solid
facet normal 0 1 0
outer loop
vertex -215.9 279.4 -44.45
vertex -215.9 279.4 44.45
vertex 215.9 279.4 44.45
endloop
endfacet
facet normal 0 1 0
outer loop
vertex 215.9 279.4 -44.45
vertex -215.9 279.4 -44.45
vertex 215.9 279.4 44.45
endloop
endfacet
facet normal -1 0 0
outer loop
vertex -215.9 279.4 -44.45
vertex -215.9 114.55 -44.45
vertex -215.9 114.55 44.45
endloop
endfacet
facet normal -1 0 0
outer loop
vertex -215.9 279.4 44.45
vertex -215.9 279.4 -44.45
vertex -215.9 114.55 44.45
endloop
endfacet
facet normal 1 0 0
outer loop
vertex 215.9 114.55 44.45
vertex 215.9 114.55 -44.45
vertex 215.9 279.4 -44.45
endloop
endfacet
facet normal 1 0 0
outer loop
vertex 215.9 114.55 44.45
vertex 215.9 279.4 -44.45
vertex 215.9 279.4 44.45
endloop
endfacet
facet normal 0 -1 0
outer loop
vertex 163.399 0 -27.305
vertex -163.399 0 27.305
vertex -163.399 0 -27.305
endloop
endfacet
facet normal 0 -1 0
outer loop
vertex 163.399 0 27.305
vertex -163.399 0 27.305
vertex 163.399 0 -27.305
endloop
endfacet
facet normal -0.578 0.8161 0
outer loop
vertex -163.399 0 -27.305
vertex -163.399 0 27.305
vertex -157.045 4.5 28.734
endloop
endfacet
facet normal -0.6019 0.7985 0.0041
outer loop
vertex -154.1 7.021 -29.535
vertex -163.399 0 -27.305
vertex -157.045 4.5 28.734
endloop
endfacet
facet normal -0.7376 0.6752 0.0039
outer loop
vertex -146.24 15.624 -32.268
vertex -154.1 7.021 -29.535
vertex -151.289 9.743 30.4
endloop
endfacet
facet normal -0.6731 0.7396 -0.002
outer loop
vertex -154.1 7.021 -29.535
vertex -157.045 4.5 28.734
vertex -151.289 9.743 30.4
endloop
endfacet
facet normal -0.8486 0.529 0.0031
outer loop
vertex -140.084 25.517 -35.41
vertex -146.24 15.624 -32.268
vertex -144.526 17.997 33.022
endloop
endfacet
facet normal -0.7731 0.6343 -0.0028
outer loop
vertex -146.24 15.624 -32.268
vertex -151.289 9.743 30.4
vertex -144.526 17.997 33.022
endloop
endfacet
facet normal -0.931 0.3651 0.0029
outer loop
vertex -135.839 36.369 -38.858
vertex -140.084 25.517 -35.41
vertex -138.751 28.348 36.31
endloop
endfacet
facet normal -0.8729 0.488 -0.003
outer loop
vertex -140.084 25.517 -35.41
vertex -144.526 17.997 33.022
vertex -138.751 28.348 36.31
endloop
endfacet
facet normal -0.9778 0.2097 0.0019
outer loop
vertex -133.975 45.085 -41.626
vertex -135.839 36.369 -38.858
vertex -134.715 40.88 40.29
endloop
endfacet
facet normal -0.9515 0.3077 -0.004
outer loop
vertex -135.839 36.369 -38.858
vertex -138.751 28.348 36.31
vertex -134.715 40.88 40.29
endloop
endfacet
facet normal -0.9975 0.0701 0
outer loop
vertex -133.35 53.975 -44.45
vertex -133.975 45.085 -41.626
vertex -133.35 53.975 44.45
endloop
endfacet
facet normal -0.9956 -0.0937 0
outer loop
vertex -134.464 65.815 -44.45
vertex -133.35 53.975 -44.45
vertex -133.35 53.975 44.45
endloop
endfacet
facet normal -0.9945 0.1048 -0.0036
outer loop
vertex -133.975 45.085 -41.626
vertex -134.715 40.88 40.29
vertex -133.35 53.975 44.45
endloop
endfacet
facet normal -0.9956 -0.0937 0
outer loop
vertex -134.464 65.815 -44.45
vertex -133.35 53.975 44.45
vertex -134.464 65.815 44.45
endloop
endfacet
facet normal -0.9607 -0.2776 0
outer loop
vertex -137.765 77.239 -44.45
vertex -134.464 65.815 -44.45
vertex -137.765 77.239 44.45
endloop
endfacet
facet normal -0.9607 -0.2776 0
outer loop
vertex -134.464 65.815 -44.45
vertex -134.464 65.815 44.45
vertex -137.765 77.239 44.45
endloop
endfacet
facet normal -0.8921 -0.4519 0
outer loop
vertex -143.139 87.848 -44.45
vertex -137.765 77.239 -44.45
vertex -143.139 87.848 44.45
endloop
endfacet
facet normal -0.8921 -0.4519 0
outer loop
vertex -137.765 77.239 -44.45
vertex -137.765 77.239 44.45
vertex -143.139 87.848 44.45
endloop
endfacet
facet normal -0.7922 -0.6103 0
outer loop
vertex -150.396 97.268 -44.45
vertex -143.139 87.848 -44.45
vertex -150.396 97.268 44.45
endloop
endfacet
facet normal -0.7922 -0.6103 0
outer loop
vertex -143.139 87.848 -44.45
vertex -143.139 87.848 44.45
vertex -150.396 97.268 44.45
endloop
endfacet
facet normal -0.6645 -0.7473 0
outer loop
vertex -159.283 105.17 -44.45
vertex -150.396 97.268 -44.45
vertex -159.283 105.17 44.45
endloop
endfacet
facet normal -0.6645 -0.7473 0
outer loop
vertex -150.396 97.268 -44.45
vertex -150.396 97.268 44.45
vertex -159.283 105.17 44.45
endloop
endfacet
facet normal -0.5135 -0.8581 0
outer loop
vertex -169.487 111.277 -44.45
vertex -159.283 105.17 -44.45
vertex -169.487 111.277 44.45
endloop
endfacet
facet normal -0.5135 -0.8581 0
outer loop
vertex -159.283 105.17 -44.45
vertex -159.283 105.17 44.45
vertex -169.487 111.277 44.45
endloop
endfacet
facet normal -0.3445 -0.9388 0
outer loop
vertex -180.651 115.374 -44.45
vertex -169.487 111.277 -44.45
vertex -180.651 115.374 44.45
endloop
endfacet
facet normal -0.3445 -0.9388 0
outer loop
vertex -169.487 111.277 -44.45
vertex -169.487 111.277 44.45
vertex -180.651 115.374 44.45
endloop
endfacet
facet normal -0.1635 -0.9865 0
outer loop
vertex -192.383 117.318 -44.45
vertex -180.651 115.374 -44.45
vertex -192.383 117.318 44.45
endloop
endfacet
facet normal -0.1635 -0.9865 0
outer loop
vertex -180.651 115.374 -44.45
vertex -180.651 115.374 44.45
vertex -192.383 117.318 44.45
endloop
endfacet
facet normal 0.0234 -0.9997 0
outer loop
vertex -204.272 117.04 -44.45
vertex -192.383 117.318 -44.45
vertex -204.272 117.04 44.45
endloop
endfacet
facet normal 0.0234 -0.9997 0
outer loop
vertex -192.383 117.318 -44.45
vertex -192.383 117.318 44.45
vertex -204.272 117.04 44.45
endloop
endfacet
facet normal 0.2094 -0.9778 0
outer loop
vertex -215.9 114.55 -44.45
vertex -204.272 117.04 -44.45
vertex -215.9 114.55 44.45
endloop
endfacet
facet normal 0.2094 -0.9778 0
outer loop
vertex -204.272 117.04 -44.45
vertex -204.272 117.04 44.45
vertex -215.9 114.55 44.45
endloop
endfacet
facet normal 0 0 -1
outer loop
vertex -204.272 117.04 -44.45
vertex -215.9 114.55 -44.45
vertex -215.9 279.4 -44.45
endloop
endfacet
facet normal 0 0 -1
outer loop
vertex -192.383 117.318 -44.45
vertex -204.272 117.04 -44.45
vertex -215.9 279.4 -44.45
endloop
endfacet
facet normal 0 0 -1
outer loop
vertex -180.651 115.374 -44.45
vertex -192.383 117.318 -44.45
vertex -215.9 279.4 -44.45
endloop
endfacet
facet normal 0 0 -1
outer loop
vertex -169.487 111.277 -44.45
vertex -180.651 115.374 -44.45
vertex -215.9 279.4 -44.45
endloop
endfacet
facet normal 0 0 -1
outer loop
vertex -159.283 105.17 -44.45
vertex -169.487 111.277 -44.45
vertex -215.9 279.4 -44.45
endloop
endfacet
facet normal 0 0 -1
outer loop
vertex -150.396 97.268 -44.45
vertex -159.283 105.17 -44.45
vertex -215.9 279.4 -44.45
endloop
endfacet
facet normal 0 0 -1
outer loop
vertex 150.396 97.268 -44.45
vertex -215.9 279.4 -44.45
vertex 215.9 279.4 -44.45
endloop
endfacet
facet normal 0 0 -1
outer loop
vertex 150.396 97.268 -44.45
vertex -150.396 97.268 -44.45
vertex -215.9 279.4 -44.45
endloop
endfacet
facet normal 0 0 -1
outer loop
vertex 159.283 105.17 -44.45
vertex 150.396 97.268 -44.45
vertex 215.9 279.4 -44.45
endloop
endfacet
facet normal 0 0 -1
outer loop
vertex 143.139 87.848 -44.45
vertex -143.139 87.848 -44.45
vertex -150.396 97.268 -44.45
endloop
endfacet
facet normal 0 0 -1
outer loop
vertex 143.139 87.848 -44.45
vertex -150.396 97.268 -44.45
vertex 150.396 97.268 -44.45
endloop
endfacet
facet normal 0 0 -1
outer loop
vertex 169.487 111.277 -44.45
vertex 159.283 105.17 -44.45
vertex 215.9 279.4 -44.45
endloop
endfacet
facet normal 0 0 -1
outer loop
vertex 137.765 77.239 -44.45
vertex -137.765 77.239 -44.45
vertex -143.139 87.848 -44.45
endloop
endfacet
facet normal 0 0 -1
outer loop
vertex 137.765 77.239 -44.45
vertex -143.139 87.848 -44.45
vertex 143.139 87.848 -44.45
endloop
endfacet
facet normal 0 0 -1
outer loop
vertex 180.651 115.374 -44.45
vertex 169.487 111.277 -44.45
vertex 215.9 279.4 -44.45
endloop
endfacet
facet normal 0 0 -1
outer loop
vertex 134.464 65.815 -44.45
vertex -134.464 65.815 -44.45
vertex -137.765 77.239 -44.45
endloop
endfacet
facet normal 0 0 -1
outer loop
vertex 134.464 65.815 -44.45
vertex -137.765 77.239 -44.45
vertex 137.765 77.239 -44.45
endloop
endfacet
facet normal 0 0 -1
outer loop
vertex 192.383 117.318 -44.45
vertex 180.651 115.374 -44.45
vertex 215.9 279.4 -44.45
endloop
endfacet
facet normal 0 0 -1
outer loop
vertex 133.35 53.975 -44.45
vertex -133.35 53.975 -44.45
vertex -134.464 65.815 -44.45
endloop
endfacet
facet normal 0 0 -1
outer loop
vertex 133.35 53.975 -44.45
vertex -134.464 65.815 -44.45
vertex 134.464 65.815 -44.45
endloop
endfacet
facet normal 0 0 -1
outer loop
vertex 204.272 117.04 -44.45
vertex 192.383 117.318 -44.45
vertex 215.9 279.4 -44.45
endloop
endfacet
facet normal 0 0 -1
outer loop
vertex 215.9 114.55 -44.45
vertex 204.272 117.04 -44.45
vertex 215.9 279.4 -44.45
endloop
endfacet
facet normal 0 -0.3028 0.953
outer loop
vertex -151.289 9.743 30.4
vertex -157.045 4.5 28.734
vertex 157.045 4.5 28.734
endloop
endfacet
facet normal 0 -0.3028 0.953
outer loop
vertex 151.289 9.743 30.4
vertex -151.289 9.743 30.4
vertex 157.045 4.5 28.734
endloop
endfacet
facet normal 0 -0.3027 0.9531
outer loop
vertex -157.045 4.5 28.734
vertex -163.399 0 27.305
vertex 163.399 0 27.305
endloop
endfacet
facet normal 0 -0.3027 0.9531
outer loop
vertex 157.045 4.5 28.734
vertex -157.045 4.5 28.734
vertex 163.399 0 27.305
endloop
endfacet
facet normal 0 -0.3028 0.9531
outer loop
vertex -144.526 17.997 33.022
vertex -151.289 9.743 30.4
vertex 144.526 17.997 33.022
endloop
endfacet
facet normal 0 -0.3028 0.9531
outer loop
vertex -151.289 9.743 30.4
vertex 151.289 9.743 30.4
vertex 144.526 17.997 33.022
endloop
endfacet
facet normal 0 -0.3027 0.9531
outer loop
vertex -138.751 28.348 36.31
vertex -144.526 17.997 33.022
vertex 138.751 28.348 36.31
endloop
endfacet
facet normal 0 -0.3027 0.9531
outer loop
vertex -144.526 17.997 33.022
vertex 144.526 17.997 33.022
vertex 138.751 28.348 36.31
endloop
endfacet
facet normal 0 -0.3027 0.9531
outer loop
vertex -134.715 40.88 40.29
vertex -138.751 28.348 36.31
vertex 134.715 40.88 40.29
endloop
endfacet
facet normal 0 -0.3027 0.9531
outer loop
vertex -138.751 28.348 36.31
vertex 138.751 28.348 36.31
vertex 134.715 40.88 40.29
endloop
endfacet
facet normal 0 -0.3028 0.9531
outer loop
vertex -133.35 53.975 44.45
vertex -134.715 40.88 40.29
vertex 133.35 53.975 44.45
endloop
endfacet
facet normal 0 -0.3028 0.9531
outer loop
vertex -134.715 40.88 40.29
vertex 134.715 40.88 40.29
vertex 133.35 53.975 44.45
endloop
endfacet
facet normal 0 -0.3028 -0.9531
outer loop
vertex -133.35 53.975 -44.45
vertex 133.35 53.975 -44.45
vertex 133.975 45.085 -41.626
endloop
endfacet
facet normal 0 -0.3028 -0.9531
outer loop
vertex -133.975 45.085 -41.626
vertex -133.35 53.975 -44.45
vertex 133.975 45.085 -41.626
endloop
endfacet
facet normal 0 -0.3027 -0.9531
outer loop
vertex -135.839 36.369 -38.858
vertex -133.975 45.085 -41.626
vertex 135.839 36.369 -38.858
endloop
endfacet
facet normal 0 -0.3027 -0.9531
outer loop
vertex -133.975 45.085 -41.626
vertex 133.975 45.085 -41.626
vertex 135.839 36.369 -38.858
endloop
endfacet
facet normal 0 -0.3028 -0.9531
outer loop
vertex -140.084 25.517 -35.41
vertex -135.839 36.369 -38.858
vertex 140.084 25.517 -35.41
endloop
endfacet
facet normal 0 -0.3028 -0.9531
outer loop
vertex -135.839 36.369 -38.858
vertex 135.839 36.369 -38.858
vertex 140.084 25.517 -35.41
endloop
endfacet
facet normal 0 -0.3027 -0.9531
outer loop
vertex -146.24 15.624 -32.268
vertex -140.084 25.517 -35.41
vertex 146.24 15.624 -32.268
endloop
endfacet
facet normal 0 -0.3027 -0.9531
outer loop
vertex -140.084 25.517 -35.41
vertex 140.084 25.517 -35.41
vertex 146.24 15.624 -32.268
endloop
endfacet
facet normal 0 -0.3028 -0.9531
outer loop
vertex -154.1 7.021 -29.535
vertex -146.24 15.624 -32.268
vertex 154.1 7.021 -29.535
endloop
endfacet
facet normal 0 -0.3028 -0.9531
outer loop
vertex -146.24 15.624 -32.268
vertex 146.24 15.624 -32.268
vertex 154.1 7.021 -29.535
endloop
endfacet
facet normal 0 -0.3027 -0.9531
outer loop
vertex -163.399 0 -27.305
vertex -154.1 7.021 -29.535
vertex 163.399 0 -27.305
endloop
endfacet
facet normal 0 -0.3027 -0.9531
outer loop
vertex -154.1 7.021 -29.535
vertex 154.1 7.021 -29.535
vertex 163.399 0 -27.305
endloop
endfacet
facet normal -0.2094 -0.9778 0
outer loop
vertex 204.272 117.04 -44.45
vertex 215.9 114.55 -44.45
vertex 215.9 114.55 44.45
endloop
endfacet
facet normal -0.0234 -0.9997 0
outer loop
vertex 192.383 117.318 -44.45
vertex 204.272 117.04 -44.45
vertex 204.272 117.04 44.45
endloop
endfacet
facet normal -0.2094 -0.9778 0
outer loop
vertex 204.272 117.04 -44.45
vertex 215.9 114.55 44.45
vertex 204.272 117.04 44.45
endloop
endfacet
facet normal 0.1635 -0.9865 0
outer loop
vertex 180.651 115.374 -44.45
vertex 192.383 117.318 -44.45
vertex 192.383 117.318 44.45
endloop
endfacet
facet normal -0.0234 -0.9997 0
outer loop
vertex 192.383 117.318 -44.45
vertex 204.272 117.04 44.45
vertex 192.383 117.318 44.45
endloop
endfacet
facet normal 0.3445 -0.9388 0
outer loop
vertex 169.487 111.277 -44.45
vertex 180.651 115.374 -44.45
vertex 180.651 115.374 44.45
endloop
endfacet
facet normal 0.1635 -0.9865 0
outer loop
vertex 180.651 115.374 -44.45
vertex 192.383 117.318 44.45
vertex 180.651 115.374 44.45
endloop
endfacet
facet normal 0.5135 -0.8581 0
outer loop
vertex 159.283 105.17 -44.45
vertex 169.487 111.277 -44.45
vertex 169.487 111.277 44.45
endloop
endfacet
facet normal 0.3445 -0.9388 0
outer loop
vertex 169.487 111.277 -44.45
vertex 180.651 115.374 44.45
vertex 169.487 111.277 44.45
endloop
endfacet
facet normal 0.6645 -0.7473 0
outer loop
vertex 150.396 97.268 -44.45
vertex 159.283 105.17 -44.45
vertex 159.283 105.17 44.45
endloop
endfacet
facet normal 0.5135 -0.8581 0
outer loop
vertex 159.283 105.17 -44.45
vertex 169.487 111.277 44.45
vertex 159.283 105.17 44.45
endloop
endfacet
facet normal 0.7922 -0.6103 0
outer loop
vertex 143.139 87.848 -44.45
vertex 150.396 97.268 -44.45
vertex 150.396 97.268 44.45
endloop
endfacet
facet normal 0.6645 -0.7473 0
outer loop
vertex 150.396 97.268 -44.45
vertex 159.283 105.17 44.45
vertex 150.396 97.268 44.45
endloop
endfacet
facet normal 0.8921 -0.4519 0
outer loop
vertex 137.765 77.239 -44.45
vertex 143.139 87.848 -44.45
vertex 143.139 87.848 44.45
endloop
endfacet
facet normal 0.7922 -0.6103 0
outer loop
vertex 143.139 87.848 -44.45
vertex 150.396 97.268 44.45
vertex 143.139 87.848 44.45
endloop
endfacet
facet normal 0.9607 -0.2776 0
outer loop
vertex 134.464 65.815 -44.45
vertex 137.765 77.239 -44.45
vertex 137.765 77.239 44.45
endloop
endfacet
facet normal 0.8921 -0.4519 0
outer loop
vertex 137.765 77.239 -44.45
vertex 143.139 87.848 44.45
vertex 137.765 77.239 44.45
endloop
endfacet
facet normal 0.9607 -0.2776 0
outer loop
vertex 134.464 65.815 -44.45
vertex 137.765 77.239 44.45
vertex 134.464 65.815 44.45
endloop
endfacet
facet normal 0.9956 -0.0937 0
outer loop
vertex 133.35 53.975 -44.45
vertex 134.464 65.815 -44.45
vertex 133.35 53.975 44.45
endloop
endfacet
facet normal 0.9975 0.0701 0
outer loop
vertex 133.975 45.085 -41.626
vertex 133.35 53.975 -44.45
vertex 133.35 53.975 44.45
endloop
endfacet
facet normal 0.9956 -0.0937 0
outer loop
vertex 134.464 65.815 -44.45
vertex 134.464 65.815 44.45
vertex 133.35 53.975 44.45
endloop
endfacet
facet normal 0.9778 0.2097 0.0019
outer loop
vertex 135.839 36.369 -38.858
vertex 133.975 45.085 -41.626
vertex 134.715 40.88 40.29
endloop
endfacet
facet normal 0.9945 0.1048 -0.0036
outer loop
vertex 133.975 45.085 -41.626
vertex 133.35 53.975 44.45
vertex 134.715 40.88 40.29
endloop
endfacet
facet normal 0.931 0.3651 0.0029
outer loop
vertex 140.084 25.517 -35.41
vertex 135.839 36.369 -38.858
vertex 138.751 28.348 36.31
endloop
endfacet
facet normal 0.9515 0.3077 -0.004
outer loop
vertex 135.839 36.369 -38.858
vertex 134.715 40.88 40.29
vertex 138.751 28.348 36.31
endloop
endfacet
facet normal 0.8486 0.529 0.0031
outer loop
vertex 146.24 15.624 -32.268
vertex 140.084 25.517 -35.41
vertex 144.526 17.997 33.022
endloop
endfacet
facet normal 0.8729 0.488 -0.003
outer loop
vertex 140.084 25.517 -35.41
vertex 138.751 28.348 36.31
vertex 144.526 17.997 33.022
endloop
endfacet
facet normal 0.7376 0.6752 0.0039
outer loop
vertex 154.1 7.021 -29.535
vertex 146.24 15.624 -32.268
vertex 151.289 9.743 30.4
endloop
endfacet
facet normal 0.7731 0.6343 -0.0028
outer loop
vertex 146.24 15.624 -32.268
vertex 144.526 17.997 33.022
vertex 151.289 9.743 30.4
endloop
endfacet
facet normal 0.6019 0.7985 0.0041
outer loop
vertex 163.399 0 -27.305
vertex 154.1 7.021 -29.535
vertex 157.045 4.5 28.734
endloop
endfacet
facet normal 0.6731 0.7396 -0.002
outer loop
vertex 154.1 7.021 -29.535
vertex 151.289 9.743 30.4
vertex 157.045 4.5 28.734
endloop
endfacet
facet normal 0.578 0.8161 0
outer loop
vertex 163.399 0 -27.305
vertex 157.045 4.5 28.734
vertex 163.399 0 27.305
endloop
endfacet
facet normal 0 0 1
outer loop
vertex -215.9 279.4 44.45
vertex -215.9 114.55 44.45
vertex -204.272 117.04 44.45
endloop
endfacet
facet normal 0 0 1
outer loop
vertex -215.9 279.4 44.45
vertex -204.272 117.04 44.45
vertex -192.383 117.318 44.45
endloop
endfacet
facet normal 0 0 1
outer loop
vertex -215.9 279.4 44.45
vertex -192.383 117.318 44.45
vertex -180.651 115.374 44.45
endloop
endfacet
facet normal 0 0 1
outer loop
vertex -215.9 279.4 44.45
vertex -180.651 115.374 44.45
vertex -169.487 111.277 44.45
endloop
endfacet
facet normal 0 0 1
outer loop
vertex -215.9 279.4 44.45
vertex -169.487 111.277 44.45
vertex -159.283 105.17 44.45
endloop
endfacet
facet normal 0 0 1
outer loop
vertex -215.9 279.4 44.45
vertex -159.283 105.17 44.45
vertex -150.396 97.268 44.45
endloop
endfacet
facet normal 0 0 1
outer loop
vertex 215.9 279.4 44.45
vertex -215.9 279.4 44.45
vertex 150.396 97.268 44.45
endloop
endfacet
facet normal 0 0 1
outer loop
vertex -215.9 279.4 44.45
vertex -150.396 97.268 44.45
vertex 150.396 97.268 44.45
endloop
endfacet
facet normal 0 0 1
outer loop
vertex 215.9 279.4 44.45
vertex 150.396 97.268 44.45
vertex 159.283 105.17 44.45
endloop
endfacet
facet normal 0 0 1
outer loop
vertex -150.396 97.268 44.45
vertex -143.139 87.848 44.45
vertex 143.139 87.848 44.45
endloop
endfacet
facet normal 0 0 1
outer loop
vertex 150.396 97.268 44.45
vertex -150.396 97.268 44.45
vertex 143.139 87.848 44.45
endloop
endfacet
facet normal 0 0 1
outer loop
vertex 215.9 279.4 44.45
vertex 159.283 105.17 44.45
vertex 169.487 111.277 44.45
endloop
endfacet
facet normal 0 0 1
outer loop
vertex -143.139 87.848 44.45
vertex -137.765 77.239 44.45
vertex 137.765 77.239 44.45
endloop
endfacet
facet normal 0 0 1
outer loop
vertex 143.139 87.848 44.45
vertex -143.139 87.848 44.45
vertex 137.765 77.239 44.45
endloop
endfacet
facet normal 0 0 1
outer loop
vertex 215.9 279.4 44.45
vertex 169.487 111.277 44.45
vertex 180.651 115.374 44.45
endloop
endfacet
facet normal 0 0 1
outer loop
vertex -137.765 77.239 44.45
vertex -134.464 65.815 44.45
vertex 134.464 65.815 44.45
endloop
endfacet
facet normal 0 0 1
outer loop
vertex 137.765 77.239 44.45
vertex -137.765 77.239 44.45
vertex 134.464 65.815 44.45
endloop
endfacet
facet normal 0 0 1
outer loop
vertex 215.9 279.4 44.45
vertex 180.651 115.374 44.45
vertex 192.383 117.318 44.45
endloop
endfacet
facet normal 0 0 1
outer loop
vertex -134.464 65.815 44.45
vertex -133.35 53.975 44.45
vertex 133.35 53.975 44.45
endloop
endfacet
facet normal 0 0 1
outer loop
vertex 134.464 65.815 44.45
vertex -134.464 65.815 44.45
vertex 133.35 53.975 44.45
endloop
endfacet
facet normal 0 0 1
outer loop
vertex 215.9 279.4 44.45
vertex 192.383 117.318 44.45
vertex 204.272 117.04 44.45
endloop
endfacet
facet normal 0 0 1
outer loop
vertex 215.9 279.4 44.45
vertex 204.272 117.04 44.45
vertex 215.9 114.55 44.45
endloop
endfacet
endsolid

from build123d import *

# Parameters (mm, degrees)
F0_W          = 431.8
F0_H          = 88.9
F1_DEPTH      = 279.4
F2_R          = 63.5
F3_DEPTH      = 127
F5_DEPTH      = 227.33
F5_DEPTH_BACK = 269.24


with BuildPart() as f1:
    # F0 (on Front) → F1 (new body)
    with BuildSketch(Plane.XZ):
        Rectangle(F0_W, F0_H)
    extrude(amount=-F1_DEPTH)

    # F2 (on face) → F3 (cut)
    with BuildSketch(Plane.XY.offset(44.45)):
        with Locations((-196.85, 53.975)):
            Circle(F2_R)
        with Locations((196.85, 53.975)):
            Circle(F2_R)
    extrude(amount=-F3_DEPTH, mode=Mode.SUBTRACT)

    # F4 (on Right) → F5 (cut, two sides)
    with BuildSketch(Plane.YZ) as f5_sk:
        Polygon((0, 44.45), (0, 27.305), (53.975, 44.45), align=None)
        Polygon((0, -44.45), (53.975, -44.45), (0, -27.305), align=None)
    extrude(amount=-F5_DEPTH, mode=Mode.SUBTRACT)
    extrude(f5_sk.sketch, amount=F5_DEPTH_BACK, mode=Mode.SUBTRACT)


solid = f1.part
